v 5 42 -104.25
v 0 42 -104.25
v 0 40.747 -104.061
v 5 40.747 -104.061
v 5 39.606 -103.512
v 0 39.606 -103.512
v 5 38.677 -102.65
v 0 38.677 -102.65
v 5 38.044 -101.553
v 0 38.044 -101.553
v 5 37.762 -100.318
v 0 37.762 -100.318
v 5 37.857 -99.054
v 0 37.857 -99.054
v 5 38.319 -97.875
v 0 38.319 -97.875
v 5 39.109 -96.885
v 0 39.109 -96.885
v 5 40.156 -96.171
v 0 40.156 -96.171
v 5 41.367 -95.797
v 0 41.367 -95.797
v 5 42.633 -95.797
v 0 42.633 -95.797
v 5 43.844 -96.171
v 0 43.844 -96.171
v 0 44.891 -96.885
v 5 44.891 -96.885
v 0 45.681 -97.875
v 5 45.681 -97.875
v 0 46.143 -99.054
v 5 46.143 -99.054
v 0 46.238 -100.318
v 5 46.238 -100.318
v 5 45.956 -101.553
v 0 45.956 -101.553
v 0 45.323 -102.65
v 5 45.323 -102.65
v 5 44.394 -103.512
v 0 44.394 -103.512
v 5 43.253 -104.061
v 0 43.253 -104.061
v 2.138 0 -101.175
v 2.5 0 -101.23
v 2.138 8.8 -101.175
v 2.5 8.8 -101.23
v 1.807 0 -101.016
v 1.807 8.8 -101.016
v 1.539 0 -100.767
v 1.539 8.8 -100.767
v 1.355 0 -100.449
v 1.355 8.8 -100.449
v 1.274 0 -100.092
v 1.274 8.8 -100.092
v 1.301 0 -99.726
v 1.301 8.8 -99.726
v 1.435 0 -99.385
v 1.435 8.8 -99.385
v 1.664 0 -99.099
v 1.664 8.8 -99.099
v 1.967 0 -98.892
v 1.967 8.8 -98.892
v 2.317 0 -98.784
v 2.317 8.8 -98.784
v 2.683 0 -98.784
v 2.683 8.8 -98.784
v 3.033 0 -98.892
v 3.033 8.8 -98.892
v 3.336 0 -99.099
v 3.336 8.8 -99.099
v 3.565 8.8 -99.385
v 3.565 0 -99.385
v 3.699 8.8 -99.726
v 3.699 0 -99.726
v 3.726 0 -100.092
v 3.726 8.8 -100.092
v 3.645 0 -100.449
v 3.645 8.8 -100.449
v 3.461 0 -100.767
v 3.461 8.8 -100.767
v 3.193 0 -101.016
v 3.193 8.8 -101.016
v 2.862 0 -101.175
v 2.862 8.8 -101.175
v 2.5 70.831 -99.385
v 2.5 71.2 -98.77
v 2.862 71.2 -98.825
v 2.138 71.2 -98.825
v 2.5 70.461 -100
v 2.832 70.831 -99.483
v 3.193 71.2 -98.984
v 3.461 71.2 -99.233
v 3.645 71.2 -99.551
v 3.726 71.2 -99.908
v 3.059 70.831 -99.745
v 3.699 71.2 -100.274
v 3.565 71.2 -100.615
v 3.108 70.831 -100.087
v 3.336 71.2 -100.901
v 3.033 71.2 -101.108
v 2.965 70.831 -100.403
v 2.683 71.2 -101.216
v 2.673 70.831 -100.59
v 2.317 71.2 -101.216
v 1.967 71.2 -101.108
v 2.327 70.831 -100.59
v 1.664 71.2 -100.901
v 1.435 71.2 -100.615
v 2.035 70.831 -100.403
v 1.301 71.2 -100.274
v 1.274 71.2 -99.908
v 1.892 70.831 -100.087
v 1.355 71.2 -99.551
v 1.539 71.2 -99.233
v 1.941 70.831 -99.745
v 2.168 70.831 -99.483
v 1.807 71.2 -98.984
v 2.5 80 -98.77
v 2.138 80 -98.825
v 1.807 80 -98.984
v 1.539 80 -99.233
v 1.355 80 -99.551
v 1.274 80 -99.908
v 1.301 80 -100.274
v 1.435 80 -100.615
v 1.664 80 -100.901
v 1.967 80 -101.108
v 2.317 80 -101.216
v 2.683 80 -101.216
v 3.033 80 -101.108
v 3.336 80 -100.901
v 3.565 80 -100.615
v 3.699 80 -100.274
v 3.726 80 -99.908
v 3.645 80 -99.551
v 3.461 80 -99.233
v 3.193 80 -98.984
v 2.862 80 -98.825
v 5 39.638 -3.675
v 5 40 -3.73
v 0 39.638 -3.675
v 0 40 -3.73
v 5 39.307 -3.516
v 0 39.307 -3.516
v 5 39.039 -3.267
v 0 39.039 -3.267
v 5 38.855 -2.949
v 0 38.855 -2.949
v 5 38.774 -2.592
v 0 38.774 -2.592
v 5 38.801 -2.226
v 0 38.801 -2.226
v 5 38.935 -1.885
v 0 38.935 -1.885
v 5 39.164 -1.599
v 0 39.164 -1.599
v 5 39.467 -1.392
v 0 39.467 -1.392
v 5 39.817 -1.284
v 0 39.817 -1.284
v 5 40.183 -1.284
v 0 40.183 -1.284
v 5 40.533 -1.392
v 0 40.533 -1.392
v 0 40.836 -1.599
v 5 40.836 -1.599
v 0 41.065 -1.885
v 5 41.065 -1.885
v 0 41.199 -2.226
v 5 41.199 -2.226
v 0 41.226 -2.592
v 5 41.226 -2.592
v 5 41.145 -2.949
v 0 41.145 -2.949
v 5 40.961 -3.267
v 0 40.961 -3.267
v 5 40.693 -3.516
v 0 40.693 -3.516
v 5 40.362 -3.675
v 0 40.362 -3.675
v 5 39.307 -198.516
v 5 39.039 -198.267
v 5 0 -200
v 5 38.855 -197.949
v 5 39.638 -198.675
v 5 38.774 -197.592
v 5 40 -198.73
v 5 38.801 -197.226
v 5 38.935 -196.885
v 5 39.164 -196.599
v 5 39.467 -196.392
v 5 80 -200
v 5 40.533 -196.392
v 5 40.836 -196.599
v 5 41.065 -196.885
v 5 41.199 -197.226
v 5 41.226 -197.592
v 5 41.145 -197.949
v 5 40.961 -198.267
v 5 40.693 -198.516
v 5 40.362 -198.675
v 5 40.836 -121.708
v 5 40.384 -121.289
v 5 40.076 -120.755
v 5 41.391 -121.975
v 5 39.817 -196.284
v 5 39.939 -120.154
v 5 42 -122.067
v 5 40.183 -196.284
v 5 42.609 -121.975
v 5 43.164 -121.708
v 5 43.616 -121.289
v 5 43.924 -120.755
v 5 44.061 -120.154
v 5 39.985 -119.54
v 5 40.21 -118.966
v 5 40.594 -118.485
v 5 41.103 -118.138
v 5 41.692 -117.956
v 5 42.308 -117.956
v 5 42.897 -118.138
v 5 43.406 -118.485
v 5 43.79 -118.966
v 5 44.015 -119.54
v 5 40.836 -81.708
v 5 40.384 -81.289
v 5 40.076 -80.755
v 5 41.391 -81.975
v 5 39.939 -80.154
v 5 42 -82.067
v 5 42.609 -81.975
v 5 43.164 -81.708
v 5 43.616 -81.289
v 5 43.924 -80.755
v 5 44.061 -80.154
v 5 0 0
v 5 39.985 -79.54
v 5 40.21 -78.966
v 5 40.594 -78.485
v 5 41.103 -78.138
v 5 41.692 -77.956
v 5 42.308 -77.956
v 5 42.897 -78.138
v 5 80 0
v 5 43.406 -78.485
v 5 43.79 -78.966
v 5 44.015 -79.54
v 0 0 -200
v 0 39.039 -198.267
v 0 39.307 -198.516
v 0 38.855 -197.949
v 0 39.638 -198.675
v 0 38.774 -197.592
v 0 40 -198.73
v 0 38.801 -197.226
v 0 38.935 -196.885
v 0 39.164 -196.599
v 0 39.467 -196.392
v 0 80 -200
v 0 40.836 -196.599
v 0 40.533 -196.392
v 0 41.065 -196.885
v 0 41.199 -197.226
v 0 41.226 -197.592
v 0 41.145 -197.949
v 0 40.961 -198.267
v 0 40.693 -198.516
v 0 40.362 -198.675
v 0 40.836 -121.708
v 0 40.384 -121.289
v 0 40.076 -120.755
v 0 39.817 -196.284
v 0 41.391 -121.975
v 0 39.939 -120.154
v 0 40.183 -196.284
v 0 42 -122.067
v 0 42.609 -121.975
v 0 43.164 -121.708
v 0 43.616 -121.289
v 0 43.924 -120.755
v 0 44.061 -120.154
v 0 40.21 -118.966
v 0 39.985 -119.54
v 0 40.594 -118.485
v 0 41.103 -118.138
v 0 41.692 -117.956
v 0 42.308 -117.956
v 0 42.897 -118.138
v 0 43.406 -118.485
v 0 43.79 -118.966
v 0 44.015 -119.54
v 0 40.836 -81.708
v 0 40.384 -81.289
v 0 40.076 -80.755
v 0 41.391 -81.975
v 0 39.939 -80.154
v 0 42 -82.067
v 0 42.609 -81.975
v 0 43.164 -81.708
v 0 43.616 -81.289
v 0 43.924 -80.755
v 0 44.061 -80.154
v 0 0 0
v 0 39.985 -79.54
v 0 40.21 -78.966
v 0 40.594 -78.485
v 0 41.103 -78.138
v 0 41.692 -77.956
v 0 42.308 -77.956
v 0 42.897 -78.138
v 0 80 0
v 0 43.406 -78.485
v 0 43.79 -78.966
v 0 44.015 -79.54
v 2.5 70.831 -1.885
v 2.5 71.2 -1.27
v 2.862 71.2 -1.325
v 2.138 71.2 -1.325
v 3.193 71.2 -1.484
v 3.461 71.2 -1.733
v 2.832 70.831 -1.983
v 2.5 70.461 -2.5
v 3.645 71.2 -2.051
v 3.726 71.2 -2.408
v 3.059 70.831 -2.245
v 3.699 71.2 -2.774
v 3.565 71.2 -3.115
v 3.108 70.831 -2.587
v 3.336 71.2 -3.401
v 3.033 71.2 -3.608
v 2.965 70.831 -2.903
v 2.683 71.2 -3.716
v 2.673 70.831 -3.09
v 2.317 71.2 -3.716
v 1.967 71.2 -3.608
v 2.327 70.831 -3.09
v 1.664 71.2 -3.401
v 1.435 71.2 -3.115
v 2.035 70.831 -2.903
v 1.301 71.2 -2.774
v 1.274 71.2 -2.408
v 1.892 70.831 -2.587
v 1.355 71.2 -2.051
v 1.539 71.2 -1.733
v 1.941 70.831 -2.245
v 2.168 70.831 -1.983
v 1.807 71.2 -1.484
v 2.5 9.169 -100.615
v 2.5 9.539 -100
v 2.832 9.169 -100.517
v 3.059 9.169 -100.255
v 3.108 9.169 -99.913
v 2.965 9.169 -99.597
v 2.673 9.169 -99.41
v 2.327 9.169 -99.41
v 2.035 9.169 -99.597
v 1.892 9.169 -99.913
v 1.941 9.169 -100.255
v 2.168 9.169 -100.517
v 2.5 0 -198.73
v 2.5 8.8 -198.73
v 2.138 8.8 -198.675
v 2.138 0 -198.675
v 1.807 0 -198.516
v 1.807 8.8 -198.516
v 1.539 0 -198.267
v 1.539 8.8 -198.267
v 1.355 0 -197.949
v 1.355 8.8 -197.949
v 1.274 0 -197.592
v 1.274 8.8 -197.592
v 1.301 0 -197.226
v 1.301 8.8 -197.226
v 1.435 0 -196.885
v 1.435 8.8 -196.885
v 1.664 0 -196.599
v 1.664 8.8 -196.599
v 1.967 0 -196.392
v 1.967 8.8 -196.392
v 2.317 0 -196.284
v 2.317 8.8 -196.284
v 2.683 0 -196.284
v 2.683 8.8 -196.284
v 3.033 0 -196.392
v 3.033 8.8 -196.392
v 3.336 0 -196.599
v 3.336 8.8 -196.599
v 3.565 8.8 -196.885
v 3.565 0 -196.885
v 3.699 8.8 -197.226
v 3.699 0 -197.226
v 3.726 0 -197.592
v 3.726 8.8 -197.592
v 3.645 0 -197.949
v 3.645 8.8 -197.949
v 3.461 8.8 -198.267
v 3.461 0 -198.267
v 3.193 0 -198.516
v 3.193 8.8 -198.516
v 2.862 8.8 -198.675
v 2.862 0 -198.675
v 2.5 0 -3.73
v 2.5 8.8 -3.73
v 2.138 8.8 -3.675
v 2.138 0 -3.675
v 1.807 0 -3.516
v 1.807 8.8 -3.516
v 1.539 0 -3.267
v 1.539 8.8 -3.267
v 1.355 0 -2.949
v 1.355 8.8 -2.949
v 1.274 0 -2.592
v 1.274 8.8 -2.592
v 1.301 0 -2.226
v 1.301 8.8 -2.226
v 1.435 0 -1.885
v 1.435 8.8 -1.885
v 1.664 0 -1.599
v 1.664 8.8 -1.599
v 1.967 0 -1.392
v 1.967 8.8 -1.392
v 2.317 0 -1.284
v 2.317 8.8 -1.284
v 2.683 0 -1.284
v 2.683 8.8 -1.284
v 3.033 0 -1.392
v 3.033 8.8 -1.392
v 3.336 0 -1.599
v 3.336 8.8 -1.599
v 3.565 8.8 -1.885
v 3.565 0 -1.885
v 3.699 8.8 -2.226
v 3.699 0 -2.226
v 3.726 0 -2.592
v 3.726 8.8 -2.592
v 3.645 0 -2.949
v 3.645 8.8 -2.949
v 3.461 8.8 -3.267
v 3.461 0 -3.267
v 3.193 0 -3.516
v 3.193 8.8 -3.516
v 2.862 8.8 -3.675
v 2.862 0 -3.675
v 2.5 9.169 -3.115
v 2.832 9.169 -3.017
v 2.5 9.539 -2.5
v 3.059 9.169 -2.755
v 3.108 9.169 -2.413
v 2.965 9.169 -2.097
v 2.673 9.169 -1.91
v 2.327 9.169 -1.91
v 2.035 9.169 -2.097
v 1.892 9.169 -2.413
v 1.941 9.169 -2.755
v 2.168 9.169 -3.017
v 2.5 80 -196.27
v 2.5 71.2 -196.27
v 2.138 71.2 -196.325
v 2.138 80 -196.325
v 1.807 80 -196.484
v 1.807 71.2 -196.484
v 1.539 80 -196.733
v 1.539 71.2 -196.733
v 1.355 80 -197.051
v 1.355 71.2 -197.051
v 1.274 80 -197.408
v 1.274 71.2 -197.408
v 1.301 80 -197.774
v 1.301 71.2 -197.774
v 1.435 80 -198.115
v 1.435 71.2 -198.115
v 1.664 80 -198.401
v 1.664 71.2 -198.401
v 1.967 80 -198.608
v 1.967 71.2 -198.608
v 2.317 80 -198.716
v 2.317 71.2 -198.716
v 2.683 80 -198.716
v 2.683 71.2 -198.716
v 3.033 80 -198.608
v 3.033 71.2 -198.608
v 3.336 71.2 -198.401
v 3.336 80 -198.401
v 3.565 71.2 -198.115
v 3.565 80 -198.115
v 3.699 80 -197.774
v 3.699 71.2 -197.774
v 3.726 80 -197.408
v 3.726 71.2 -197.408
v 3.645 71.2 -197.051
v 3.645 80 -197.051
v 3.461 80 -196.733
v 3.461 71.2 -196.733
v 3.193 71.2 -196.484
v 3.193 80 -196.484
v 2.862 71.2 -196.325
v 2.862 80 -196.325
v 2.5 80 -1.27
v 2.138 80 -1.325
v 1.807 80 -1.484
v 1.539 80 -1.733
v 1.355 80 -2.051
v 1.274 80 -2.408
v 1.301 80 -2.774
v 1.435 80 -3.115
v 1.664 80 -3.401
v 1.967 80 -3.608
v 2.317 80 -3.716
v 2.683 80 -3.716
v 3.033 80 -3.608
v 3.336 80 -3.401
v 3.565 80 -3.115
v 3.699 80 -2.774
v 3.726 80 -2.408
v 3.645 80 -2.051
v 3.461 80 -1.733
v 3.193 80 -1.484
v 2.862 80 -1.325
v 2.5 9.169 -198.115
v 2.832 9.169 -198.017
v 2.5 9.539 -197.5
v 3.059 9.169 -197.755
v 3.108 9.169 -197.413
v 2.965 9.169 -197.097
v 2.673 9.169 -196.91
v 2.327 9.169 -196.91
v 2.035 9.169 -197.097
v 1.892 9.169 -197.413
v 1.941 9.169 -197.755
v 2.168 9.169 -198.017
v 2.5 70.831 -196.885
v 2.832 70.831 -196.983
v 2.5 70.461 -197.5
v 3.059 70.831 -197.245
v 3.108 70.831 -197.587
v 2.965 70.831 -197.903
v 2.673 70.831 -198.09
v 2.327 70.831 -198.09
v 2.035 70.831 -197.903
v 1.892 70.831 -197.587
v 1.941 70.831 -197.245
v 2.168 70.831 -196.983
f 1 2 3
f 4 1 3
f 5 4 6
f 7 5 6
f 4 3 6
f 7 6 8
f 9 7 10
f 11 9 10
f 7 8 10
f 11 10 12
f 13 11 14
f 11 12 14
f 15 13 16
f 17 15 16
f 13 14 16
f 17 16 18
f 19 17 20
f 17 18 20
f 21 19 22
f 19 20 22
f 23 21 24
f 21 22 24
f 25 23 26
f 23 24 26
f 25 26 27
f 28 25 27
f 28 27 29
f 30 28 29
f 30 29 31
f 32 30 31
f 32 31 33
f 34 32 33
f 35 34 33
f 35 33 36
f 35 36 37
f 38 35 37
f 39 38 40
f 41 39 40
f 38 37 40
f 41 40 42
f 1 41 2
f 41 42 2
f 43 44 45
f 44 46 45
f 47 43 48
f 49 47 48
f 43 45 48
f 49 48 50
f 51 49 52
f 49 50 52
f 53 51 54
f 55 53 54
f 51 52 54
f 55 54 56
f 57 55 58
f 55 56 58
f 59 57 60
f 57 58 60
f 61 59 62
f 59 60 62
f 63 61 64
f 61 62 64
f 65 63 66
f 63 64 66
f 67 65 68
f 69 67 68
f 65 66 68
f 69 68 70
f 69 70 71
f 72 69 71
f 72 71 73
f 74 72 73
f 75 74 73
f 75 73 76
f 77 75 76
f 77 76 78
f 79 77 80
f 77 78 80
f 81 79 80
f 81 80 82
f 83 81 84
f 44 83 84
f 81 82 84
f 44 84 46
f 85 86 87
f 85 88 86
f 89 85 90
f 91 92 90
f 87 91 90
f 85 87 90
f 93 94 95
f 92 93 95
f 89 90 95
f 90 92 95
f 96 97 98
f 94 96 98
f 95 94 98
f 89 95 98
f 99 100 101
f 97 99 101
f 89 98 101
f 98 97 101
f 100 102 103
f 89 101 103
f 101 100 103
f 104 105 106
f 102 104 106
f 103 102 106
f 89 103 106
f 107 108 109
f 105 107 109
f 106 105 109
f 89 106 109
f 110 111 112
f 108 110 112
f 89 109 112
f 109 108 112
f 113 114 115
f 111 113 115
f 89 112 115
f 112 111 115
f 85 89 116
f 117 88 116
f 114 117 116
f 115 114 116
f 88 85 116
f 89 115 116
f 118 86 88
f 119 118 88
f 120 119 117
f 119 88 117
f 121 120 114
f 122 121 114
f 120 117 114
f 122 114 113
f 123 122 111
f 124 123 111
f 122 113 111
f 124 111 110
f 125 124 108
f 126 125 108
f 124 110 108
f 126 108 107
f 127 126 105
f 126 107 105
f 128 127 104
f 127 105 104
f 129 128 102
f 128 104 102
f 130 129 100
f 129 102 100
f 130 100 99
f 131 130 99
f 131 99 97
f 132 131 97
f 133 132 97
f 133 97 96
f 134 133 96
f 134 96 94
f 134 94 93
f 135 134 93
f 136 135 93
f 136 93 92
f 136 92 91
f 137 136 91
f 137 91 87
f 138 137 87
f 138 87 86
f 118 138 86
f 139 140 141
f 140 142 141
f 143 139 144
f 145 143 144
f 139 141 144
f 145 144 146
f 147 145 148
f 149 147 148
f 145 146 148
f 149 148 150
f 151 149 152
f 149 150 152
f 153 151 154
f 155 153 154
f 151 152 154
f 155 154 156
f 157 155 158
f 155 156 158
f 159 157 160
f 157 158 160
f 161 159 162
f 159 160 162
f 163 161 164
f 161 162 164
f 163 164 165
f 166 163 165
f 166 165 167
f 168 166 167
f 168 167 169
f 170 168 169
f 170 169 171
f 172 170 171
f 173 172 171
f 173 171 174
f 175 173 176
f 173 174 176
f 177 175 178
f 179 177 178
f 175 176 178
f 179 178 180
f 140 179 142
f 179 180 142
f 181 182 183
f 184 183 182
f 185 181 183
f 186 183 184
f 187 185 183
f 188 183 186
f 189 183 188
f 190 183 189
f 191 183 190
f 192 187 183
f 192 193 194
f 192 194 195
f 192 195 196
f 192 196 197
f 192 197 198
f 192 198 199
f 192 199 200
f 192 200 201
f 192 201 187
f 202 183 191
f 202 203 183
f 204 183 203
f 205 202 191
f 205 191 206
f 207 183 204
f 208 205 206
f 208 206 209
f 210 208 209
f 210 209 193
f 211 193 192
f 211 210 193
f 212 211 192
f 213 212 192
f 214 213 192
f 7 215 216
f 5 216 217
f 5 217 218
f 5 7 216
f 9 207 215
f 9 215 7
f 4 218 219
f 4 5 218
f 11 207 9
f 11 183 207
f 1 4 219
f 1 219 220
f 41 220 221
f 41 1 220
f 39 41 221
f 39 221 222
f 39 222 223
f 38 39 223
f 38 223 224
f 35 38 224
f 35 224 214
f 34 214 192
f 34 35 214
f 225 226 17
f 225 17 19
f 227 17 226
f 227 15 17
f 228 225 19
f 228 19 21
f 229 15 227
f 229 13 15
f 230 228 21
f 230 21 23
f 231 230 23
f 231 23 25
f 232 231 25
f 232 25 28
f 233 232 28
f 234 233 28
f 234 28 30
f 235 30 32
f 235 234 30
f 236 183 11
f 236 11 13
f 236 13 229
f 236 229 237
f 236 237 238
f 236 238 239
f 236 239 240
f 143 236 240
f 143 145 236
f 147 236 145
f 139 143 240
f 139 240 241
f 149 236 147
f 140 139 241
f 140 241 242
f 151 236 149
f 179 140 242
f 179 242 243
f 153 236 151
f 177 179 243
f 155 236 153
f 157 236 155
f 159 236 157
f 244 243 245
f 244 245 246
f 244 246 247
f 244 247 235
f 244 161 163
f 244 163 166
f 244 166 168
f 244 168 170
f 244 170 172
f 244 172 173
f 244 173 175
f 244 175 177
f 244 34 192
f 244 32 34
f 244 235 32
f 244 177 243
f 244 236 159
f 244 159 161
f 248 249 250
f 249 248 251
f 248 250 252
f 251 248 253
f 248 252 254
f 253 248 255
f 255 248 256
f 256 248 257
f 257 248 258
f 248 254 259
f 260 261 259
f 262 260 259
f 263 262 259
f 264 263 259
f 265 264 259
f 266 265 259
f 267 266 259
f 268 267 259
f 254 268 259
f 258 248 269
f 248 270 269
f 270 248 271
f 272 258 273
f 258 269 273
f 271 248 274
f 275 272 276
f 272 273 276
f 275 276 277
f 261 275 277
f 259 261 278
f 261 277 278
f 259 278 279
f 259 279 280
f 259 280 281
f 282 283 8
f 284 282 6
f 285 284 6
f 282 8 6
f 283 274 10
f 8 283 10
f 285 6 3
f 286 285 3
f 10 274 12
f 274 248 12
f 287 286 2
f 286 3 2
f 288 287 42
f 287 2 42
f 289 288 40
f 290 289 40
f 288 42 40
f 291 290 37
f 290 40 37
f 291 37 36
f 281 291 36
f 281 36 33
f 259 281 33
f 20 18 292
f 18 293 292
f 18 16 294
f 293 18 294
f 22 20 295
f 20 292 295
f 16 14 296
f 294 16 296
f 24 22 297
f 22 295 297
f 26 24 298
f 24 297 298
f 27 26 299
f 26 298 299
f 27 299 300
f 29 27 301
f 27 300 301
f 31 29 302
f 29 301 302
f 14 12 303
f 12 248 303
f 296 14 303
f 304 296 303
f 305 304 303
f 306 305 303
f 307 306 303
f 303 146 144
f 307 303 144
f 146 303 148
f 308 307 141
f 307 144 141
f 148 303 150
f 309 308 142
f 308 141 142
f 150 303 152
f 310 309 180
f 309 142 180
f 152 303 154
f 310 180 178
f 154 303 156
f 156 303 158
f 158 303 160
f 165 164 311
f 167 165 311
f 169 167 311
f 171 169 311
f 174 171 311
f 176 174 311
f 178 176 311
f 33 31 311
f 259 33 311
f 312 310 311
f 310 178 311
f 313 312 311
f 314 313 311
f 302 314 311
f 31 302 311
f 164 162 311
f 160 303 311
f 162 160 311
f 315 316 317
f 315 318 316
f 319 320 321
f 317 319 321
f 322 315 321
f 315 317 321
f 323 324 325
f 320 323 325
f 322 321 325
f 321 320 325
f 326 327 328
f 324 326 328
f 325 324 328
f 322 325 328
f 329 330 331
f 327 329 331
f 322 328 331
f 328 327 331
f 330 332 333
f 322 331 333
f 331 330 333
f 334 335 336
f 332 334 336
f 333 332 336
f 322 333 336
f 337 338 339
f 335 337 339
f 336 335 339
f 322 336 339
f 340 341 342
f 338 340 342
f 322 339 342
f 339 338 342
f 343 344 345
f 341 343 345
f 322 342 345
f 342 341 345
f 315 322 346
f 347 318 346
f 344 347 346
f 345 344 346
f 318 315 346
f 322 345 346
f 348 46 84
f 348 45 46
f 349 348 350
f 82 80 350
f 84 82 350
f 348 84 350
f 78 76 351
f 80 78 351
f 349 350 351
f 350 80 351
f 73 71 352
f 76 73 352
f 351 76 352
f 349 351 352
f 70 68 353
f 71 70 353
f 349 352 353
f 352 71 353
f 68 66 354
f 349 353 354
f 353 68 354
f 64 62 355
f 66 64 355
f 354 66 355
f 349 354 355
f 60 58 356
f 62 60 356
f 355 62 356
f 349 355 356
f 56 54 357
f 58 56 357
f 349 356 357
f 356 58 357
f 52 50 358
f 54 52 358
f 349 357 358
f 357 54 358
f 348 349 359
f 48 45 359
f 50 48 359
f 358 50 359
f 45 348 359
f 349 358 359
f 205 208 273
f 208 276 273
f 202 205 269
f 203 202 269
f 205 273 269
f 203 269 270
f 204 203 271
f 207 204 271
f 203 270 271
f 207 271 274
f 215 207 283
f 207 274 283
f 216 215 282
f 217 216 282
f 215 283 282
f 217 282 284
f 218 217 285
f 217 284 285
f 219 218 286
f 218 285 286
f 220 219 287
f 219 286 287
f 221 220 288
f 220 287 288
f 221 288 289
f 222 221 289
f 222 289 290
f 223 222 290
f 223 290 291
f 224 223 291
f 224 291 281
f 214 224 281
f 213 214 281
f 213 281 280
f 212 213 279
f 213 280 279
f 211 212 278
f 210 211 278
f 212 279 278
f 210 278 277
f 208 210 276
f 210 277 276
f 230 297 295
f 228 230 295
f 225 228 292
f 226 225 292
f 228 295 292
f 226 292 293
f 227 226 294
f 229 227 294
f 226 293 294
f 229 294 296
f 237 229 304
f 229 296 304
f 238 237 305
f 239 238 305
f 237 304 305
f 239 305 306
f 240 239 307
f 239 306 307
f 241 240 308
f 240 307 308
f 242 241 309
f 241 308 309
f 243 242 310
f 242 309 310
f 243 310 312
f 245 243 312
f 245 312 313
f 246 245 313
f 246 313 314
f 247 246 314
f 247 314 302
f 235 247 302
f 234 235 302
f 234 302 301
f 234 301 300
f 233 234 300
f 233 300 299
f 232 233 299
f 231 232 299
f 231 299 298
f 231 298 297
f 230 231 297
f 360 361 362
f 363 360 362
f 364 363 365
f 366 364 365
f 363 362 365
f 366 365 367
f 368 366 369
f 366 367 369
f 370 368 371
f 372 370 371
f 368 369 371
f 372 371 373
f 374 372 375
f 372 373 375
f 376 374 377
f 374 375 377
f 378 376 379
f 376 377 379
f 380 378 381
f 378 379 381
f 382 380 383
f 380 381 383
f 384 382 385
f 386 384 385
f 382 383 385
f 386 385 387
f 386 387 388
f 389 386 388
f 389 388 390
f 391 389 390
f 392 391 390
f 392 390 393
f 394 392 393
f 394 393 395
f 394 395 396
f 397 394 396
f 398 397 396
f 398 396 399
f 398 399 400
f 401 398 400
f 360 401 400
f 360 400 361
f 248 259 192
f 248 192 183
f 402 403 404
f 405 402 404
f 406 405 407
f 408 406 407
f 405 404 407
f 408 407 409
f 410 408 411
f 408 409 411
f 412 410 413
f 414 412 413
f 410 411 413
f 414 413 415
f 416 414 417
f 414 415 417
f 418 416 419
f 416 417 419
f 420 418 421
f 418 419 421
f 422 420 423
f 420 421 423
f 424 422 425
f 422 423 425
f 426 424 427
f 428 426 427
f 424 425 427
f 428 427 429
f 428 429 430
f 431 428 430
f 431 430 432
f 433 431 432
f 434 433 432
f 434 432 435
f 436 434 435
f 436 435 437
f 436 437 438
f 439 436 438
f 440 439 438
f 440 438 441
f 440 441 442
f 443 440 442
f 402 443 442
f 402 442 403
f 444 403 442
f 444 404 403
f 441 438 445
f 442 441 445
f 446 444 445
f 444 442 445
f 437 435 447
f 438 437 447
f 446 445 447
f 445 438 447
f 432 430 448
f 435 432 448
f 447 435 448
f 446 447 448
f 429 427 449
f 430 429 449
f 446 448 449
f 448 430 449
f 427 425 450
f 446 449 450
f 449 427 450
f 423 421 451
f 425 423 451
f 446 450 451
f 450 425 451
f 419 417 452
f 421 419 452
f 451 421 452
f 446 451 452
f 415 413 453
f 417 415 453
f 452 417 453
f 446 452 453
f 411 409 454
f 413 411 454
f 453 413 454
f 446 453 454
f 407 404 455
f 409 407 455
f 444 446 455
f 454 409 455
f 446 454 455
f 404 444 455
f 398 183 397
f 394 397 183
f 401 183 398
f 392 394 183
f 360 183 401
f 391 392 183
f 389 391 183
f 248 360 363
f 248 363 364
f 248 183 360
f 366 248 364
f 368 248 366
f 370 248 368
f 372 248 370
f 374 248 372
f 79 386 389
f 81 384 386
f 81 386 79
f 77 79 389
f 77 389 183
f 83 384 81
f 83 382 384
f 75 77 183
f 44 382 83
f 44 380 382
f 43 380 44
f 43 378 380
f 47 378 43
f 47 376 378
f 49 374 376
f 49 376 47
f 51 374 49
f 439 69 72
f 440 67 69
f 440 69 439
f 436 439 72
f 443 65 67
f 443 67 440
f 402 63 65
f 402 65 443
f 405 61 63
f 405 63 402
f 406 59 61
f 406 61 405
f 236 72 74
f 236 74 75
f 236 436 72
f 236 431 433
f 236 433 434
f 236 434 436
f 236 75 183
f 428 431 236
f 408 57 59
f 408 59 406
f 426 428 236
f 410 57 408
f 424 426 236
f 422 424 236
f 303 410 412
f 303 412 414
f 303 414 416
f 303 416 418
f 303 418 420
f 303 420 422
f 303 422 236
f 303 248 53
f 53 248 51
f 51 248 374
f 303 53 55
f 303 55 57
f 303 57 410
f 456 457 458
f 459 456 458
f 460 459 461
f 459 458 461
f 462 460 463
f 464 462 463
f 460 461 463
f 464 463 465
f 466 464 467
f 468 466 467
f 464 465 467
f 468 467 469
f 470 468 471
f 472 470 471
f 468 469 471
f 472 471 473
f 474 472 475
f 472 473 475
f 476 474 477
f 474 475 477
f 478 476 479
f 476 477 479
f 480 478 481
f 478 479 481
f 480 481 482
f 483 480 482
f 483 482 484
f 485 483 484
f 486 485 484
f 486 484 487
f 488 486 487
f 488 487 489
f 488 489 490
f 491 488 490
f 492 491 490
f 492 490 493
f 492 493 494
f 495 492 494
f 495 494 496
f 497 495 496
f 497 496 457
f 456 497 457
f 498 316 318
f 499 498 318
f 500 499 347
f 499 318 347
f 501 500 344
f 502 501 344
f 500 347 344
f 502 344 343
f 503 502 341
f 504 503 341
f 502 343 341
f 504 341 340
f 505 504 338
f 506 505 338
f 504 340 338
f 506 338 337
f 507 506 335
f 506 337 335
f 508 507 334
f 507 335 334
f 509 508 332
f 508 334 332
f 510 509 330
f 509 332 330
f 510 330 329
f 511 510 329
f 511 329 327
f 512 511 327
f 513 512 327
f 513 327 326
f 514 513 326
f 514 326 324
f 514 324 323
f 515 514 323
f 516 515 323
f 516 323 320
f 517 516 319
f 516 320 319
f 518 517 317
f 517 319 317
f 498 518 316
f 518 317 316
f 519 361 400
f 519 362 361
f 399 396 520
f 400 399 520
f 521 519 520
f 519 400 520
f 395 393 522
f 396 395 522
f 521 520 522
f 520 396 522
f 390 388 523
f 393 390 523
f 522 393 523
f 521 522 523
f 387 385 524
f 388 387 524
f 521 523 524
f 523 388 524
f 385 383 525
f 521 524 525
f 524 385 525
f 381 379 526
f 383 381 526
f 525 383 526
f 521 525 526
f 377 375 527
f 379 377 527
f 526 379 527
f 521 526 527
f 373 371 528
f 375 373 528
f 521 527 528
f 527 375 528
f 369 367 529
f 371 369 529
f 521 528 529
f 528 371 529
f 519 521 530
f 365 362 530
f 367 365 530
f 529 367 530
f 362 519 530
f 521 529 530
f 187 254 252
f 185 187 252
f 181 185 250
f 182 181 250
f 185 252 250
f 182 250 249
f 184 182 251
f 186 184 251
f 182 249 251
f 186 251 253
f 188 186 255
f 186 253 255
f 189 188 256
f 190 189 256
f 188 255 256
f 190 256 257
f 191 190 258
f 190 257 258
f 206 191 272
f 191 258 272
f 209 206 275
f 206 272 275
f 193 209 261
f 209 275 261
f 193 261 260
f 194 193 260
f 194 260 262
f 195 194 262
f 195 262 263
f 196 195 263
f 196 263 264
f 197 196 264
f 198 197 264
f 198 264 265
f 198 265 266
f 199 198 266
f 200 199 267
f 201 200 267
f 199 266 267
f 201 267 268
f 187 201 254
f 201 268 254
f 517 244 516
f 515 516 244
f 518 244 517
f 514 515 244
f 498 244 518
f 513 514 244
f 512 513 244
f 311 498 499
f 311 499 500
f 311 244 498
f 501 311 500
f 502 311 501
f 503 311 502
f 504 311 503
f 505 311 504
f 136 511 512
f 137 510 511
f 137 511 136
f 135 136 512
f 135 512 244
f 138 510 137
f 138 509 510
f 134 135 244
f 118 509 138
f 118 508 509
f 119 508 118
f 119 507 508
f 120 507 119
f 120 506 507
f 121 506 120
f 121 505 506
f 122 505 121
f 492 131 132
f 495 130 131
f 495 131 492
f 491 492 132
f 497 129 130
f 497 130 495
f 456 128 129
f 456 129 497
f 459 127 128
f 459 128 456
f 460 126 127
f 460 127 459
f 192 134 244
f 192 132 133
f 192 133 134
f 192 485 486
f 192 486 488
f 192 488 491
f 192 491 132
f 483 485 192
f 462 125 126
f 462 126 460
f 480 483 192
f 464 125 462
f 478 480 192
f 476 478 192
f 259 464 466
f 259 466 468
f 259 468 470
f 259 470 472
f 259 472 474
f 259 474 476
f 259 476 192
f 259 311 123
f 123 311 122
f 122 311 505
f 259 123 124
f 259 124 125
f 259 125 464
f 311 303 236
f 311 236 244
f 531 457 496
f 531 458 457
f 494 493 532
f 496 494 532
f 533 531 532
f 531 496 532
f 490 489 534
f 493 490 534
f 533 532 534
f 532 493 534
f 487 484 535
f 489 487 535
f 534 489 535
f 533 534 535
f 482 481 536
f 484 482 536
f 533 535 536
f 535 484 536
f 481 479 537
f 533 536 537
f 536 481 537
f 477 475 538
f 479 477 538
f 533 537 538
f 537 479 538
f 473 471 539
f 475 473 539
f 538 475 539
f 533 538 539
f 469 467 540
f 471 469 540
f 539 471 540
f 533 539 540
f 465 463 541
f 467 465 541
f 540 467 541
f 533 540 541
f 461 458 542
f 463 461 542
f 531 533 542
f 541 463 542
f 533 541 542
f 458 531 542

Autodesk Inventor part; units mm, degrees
ref_plane "YZ Plane" through (0, 0, 0) normal (1, 0, 0) x (0, 1, 0)
ref_plane "XZ Plane" through (0, 0, 0) normal (0, 1, 0) x (-1, 0, 0)
ref_plane "XY Plane" through (0, 0, 0) normal (0, 0, 1) x (1, 0, 0)
sketch "Esquisse1" plane through (0, 0, 0) normal (1, 0, 0) x (0, 1, 0)
  line L0 (0, 0) -> (80, 0)
  line L1 (80, 0) -> (80, -200)
  line L2 (80, -200) -> (0, -200)
  line L3 (0, -200) -> (0, 0)
  dimension "d0" = 80
  dimension "d1" = 200
extrude "Extrusion1" add sketch "Esquisse1" along normal blind 5
sketch "Esquisse3" plane through (5, 0, 0) normal (1, 0, 0) x (0, 0, -1)
  line L0 (0, 0) -> (2.5, 0)
  line L1 (0, 0) -> (200, 0) projected
  line L2 (2.5, 0) -> (2.5, 40)
  line L3 (100, 0) -> (100, 21.0843)
  point P0 (2.5, 40)
  point P1 (197.5, 40)
  dimension "d15" = 2.5
  dimension "d16" = 40
hole "Perçage2" at (5, 40, -2.5) at (5, 40, -197.5) direction (-1, 0, 0) diameter 2.459 end through all thread size "M3x0.5" class "6H" standard "ISO Metric profile"
sketch "Esquisse4" plane through (0, 0, -200) normal (0, -1, 0) x (1, 0, 0)
  line L0 (0, 200) -> (0, 197.5)
  line L1 (0, 0) -> (0, 200) projected
  line L2 (0, 197.5) -> (2.5, 197.5)
  line L3 (5, 200) -> (5, 0) projected
  point P0 (2.5, 2.5)
  point P1 (2.5, 100)
  dimension "d24" = 2.5
  dimension "d25" = 2.5
  dimension "d26" = 90
hole "Perçage3" at (2.5, 0, -2.5) at (2.5, 0, -197.5) at (2.5, 0, -100) direction (0, 1, 0) diameter 2.459 depth 8.8 tip angle 118 thread size "M3x0.5" class "6H" standard "ISO Metric profile"
sketch "Esquisse5" plane through (0, 80, 0) normal (0, 1, 0) x (1, 0, 0)
  line L0 (0, 0) -> (2.5, 0)
  line L1 (0, 0) -> (5, 0) projected
  line L2 (2.5, 0) -> (2.5, 2.5)
  line L3 (2.5, 0) -> (5, 0) construction
  line L4 (0, 200) -> (0, 0) projected
  line L5 (0, 100) -> (2.5, 100)
  point P0 (2.5, 197.5)
  dimension "d34" = 2.5
  dimension "d35" = 90
hole "Perçage4" at (2.5, 80, -2.5) at (2.5, 80, -197.5) at (2.5, 80, -100) direction (0, -1, 0) diameter 2.459 depth 8.8 tip angle 118 thread size "M3x0.5" class "6H" standard "ISO Metric profile"
sketch "Esquisse7" plane through (5, 0, 0) normal (1, 0, 0) x (0, 0, -1)
  line L0 (0, 0) -> (100, 0)
  line L1 (0, 0) -> (200, 0) projected
  line L2 (100, 0) -> (180, 0) construction
  line L3 (100, 80) -> (100, 10)
  line L4 (100, 80) -> (170, 80) construction
  line L5 (100, 10) -> (90.8075, 10)
  line L6 (100, 10) -> (80, 10)
  line L7 (80, 10) -> (80, 42)
  point P0 (120, 42)
  dimension "d50" = 100
  dimension "d53" = 70
  dimension "d54" = 90
  dimension "d67" = 20
  dimension "d68" = 32
hole "Perçage6" at (5, 42, -120) at (5, 42, -80) direction (-1, 0, 0) diameter 4.134 end through all thread size "M5x0.8" class "6H" standard "ISO Metric profile"
sketch "Esquisse8" plane through (5, 0, 0) normal (1, 0, 0) x (0, 0, -1)
  circle A0 centre (80, 42) radius 2.067 projected
  line L0 (80, 42) -> (100, 42)
  point P0 (0, 0)
  dimension "d69" = 20
hole "Perçage7" at (5, 42, -100) direction (-1, 0, 0) diameter 8.5 end through all
properties part number "chassis_côté"
